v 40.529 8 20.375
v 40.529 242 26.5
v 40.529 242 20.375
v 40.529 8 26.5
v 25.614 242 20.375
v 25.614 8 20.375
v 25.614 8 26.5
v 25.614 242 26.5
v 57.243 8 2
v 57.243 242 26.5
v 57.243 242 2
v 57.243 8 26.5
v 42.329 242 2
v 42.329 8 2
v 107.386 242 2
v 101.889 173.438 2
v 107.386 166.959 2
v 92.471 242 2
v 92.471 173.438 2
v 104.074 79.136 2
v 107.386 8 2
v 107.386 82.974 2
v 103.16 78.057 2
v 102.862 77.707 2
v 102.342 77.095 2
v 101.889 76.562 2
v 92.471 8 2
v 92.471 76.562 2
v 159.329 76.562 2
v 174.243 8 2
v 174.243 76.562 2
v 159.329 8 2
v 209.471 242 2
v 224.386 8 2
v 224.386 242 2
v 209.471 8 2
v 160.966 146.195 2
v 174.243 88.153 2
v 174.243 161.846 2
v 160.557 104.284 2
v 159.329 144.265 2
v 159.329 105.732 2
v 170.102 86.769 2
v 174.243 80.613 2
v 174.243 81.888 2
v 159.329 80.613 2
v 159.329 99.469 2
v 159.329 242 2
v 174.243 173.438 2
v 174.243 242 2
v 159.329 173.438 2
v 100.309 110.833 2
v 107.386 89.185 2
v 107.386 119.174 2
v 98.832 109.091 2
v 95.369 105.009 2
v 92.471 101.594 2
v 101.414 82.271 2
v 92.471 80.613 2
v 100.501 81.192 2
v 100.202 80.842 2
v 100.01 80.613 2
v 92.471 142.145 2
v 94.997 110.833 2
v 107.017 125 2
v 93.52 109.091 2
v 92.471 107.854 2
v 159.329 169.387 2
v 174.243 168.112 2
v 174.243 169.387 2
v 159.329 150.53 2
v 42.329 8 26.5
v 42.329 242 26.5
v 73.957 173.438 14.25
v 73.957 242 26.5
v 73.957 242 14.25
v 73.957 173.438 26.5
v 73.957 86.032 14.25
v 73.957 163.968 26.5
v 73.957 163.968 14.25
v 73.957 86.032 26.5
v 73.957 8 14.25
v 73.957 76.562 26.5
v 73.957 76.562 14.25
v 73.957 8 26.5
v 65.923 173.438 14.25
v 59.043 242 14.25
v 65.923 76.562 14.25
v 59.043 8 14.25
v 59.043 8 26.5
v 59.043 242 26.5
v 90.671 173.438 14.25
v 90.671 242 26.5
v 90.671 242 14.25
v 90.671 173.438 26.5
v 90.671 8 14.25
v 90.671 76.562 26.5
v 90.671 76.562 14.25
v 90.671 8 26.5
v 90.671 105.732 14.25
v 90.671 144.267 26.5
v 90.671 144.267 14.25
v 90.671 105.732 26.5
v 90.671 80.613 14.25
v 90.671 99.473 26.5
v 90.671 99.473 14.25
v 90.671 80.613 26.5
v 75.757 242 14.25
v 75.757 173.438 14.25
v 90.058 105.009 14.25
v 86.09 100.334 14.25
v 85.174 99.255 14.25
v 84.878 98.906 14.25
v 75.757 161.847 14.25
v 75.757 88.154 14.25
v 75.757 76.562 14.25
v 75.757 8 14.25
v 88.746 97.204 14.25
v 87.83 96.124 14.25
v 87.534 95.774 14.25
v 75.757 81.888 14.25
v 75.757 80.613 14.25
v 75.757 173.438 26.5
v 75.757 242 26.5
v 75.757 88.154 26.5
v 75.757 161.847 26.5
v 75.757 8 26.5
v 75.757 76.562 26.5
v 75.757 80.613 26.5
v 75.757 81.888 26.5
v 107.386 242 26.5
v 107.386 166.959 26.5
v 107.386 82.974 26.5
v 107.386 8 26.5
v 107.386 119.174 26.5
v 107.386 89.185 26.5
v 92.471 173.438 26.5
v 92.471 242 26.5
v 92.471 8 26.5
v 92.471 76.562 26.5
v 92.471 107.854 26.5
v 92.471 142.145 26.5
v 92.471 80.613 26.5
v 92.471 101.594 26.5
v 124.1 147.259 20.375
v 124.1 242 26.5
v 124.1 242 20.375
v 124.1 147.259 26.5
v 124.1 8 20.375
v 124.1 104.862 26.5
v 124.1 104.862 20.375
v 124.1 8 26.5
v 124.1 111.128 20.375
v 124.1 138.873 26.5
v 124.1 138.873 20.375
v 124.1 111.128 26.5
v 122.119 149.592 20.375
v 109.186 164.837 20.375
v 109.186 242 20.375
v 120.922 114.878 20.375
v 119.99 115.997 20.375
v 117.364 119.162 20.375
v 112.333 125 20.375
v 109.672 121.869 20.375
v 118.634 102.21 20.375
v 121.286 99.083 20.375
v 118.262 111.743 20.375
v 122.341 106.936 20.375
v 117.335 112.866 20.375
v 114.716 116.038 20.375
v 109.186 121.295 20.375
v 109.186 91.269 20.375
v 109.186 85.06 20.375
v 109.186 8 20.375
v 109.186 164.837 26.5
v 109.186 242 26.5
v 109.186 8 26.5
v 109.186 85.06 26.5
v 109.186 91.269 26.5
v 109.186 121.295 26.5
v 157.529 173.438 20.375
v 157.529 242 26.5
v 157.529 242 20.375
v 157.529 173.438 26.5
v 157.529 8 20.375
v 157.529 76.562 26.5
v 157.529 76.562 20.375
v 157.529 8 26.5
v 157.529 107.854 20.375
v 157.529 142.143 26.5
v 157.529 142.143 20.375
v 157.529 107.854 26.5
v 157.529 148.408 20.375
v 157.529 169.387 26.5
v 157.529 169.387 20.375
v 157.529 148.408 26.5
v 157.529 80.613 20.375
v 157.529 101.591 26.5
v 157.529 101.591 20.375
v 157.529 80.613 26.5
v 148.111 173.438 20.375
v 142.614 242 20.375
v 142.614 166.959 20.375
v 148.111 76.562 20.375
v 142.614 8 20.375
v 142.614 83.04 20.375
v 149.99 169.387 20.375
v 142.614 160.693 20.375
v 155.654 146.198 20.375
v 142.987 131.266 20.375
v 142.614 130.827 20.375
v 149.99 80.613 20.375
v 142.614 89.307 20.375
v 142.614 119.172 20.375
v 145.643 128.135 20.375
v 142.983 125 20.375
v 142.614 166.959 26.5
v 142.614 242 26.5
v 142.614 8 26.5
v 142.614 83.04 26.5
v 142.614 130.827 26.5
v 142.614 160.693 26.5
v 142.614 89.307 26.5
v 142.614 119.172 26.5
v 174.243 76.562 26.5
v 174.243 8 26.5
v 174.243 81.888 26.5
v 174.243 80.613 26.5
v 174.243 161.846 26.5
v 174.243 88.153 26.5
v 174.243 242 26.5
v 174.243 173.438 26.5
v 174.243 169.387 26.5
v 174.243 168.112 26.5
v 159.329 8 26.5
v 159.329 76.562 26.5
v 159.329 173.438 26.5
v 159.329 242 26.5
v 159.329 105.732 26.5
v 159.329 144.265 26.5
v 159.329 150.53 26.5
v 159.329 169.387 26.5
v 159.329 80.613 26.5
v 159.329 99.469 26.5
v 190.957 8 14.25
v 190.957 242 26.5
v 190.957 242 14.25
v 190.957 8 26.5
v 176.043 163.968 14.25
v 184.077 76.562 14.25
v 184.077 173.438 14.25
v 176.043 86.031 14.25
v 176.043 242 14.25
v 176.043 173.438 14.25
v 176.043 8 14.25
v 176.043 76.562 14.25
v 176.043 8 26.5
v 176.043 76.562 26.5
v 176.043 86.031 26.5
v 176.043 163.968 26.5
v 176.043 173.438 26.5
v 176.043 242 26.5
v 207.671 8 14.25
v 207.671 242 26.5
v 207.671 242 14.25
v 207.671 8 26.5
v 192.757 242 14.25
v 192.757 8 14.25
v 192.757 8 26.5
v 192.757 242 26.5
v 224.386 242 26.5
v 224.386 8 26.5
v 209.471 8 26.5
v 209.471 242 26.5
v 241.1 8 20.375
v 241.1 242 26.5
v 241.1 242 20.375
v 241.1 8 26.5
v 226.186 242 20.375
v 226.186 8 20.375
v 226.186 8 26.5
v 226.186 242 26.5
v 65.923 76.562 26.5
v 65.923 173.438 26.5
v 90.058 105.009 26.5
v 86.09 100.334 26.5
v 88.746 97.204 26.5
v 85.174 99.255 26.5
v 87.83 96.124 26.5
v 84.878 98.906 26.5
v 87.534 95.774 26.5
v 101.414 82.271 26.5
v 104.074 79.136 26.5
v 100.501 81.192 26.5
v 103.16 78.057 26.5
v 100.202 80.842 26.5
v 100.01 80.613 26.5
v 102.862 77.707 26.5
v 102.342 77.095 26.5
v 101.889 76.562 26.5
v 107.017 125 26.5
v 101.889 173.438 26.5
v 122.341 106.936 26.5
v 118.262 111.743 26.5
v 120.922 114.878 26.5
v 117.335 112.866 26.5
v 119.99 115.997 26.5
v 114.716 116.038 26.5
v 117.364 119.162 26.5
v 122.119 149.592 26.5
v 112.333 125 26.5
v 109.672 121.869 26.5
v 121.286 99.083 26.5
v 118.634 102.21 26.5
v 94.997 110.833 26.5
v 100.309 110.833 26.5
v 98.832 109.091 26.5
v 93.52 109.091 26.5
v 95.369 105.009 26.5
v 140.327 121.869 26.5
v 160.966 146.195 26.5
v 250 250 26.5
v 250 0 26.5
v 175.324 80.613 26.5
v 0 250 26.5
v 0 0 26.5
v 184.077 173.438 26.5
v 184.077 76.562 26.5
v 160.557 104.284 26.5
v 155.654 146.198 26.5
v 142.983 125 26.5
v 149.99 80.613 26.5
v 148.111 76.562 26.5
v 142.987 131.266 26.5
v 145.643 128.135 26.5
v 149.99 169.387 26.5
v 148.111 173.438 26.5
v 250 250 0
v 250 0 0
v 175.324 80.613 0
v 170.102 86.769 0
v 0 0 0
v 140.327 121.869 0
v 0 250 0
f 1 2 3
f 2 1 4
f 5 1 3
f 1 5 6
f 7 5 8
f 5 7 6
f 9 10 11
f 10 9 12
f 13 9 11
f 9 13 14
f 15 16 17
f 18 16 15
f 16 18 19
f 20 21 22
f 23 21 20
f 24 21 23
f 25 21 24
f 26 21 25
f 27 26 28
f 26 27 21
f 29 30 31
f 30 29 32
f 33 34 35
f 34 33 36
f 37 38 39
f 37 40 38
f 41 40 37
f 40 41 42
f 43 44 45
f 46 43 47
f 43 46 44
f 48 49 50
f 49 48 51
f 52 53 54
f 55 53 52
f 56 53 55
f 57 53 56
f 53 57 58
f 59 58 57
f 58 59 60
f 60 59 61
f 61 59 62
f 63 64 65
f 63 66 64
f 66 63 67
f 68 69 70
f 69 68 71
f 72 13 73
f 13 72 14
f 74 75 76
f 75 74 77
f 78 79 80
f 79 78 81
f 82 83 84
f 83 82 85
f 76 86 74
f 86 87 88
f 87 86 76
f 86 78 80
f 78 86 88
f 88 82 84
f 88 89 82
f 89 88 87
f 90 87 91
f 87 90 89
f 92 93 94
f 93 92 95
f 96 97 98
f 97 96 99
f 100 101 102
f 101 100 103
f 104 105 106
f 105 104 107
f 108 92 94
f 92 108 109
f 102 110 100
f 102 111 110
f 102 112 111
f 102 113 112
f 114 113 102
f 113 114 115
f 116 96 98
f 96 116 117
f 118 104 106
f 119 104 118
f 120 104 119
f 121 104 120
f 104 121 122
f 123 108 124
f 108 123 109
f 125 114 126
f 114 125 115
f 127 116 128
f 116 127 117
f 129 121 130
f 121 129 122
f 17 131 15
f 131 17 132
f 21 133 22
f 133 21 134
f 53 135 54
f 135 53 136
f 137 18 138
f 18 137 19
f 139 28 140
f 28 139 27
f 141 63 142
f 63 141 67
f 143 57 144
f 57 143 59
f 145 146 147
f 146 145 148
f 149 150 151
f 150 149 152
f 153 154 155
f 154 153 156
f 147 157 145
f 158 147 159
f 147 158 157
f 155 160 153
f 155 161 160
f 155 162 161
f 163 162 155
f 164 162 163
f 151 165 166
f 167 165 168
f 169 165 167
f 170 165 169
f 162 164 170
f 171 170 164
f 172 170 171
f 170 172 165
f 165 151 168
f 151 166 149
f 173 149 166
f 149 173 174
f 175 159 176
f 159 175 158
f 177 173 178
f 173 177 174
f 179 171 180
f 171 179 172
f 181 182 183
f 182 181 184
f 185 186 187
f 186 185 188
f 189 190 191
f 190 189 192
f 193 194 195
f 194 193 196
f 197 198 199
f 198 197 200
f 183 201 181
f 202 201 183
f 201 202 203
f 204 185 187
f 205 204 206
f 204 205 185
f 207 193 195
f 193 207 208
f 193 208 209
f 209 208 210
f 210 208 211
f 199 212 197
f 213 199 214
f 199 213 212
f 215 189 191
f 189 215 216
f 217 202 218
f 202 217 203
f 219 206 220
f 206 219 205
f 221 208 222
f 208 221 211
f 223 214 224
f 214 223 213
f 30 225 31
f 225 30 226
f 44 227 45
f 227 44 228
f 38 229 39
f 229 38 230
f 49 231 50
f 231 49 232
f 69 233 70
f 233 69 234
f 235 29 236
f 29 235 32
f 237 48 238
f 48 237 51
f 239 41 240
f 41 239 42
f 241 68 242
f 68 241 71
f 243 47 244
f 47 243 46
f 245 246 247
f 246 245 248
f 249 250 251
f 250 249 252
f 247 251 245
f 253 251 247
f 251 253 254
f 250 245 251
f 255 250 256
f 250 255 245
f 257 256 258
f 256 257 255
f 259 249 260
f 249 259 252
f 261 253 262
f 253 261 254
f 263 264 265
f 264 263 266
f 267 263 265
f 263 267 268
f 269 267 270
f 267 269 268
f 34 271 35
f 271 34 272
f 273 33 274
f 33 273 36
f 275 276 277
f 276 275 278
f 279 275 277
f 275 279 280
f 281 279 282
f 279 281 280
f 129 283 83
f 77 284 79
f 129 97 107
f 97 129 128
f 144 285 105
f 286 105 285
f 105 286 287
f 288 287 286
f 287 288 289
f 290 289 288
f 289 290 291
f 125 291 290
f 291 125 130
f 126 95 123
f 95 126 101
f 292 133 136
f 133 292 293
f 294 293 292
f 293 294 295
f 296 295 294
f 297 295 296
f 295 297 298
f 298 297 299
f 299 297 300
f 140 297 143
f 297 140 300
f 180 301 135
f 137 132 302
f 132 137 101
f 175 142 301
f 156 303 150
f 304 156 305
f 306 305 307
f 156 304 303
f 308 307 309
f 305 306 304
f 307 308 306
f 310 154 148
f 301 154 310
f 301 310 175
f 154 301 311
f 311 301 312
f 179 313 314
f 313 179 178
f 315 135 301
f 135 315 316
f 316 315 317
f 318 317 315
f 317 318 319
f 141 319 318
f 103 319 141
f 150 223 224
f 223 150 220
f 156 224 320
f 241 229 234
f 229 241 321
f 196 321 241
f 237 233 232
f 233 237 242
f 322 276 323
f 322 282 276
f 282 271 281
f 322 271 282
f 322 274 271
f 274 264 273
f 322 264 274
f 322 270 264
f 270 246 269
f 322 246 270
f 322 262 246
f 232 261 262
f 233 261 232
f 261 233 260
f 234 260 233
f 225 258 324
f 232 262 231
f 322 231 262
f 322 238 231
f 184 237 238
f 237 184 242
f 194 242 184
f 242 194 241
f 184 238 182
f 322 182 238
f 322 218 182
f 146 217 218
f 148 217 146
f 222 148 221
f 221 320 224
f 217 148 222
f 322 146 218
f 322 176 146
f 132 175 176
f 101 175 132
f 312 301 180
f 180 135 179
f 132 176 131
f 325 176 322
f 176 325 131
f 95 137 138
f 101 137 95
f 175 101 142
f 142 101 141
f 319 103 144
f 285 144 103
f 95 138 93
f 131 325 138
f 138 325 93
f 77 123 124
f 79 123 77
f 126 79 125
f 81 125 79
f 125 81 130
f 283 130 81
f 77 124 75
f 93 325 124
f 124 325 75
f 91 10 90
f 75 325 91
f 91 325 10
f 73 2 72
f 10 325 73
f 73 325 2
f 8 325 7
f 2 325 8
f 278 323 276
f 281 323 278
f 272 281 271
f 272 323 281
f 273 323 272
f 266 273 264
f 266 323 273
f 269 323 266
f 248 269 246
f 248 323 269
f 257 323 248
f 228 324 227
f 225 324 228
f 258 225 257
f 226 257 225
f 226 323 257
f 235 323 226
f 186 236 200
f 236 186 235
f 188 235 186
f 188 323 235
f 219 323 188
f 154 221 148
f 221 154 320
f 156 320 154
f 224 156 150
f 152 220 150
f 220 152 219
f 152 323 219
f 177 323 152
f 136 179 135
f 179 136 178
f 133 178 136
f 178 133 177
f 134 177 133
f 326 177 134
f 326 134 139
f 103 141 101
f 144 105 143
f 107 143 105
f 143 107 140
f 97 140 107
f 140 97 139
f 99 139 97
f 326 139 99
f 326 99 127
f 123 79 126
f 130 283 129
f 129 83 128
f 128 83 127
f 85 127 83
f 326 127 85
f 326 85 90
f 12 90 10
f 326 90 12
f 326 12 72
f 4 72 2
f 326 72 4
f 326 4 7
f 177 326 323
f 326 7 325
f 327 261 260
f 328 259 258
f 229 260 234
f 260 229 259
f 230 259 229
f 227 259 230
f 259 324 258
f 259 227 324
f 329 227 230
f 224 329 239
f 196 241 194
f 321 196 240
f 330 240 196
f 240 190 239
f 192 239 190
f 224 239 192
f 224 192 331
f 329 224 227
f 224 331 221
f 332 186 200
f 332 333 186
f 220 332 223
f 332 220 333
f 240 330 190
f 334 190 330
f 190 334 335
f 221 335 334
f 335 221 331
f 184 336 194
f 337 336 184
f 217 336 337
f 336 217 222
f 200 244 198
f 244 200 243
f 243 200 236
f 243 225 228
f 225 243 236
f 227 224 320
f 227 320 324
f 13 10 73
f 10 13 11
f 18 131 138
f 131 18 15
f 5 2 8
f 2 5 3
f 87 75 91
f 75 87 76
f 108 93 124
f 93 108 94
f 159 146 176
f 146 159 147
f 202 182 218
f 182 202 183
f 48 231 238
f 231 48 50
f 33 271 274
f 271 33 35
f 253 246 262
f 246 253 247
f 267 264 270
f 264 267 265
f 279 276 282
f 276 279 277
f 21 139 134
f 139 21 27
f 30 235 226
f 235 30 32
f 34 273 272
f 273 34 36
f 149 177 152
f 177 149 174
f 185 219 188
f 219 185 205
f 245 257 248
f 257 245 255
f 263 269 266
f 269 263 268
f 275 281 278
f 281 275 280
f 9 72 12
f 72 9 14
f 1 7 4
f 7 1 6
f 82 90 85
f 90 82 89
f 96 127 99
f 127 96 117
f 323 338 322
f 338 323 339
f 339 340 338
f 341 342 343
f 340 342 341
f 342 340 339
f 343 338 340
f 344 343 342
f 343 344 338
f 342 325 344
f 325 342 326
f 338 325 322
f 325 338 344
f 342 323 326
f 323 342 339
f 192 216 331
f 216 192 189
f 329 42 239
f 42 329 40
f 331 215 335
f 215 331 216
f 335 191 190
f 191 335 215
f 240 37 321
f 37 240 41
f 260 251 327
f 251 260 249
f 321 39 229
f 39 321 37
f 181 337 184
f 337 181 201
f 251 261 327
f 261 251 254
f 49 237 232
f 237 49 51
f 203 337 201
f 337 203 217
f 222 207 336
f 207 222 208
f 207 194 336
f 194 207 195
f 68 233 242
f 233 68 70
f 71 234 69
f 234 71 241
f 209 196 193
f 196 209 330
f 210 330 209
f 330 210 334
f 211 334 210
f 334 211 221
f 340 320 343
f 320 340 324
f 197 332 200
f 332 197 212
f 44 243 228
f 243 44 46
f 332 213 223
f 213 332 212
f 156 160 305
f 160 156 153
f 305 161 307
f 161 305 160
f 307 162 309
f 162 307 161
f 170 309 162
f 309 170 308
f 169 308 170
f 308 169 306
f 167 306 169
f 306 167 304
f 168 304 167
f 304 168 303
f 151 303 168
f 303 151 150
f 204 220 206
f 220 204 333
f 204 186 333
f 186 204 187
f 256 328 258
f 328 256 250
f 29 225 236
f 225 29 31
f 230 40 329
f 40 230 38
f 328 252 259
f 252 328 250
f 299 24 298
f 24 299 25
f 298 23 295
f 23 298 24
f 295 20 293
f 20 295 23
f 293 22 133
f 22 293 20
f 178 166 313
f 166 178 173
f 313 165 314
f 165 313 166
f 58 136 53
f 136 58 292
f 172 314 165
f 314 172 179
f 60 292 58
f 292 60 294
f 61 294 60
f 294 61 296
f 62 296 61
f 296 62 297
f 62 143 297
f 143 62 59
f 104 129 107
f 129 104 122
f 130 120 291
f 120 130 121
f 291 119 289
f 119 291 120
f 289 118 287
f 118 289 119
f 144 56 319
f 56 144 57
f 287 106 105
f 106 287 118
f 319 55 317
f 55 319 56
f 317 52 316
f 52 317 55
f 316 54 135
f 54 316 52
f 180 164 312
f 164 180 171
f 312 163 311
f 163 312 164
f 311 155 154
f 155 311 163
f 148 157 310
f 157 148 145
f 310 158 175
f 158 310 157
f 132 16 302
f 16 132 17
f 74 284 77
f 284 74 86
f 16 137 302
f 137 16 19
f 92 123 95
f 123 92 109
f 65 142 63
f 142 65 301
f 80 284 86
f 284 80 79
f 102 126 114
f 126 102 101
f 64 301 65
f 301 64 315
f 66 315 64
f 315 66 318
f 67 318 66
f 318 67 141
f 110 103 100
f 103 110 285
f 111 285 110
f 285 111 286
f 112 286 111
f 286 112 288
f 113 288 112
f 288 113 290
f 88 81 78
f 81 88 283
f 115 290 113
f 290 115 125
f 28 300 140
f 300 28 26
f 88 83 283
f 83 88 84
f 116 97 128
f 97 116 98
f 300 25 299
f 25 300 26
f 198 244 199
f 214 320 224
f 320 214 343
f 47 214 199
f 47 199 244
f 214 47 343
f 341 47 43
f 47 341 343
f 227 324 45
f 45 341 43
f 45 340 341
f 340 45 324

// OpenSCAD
// file: makerx_brand.scad
// =============================================================================
// makerx_brand.scad  —  Shared brand + acoustic library for MakerX tiles
// -----------------------------------------------------------------------------
// Included with include<makerx_brand.scad> by all three variant files
// (qrd / skyline / absorber). It contains ONLY parameters, functions and
// modules — NO top-level geometry — so including it is side-effect-free.
//
// BRAND SOURCE  (captured from https://makerx.com.au/ CSS + logomark SVG):
//   --color-mx-black         #0e0f10
//   --color-mx-electic-blue  #16acf2   (electric blue)
//   --color-mx-magenta       #cc3a9d
//   --color-mx-gold          #ffc023
//   signature hero gradient  electric-blue -> magenta -> gold
//   X logomark               two mirrored chevron polygons (SVG viewBox
//                            0 0 1300 1100, Y-flipped into OpenSCAD Y-up space)
//
// TERMINOLOGY -> code:
//   "brand colours"     -> MX_BLACK / MX_BLUE / MX_MAGENTA / MX_GOLD
//   "the X / logo"      -> mx_x_2d(), mx_x_placed_2d(), mx_logo_w
//   "gradient zones"    -> mx_zone_name(), mx_color_region_2d()
//   "the frame / rim"   -> frame_w, mx_frame_2d()
//   "diffusion band"    -> f_low, f_high, N, depth_unit, max_depth, max_feat_w
// =============================================================================

// ---- Brand palette (web hex; affects preview + 3MF/AMF colour only) ----------
MX_BLACK   = "#0e0f10";
MX_BLUE    = "#16acf2";   // electric blue
MX_MAGENTA = "#cc3a9d";
MX_GOLD    = "#ffc023";

// ---- Printer / derived constants --------------------------------------------
nozzle_diameter = 0.4;
layer_height    = 0.2;
ew              = nozzle_diameter * 1.125;   // extrusion width = 0.45 mm
fudge           = 0.01;                       // boolean overlap
ef_chamfer      = 0.4;                        // elephant-foot compensation
$fn            = $preview ? 24 : 48;

// ---- Tile geometry (shared defaults; a variant file may override) -----------
tile      = 250;                 // module footprint X & Y (tiles butt together)
frame_w   = 8;                   // perimeter frame / rim width (black border)
interior  = tile - 2*frame_w;    // acoustic field side length

// ---- Acoustic band targets --------------------------------------------------
c_air   = 343000;                // speed of sound in air (mm/s)
f_low   = 4000;                  // low edge of diffusion band  -> max well depth
f_high  = 10000;                 // high edge of diffusion band -> max feature width
N       = 7;                     // Schroeder prime (quadratic-residue diffuser)
periods = 2;                     // QR periods across the tile -> N*periods cells

// quadratic-residue sequence  s_n = n^2 mod N   (n = 0..N-1)
function qr_seq(n) = (n*n) % N;
function qr_max()  = max([for (n=[0:N-1]) qr_seq(n)]);   // = 4 for N=7

lambda_low  = c_air / f_low;             // 85.75 mm  (wavelength at f_low)
depth_unit  = lambda_low / (2*N);        // 6.125 mm  (QRD depth quantum)
max_depth   = qr_max() * depth_unit;     // 24.5 mm   (deepest well / tallest cell)
max_feat_w  = c_air / (2*f_high);        // 17.15 mm  (cell width must be <= this)

fin_t       = 4*ew;                      // QRD divider / structural wall = 4 perimeters (1.8mm)

// ---- X logomark polygons (Y-flipped from site SVG, viewBox 1300x1100) --------
MX_VB = 1300;   // viewBox width  (used for scaling)
MX_CX = 650;    // viewBox centre x
MX_CY = 550;    // viewBox centre y (post-flip, content is symmetric about this)

MX_X_POLY_A = [
  [900.37,1074.75], [743.06,889.31], [701.27,840.11], [691.10,828.10], [701.00,816.41],
  [719.91,794.14], [730.09,806.15], [771.87,855.40], [920.72,1030.86], [1195.18,1030.86],
  [1010.86,813.57], [982.09,779.65], [844.86,617.88], [816.04,583.92], [787.23,550.00],
  [816.04,516.08], [1195.18,69.14], [920.72,69.14], [771.87,244.61], [743.06,278.56],
  [678.81,354.31], [650.00,388.22], [605.82,440.34], [595.73,452.47], [567.28,486.75],
  [538.59,452.91], [566.96,418.55], [577.01,406.38], [621.19,354.31], [650.00,320.34],
  [663.93,303.94], [692.70,270.03], [705.59,254.82], [714.25,244.61], [734.36,220.90],
  [743.06,210.65], [900.37,25.25], [1290.00,25.25], [1035.20,325.58], [844.82,550.00],
  [873.63,583.96], [1010.86,745.70], [1039.63,779.61], [1290.00,1074.75]
];
MX_X_POLY_B = [
  [10.00,1074.75], [455.18,550.00], [324.97,396.52], [308.97,377.65], [271.46,333.43],
  [228.48,282.79], [218.55,271.10], [215.35,267.31], [10.00,25.25], [399.63,25.25],
  [404.54,31.03], [410.17,37.66], [413.40,41.45], [423.30,53.14], [609.77,269.23],
  [581.04,303.11], [394.49,87.10], [384.59,75.41], [381.36,71.62], [379.28,69.14],
  [104.82,69.14], [244.12,233.39], [247.32,237.18], [257.25,248.88], [329.00,333.43],
  [366.51,377.65], [382.51,396.52], [483.95,516.08], [512.77,550.00], [650.00,711.78],
  [678.81,745.69], [650.00,779.66], [618.79,816.41], [399.63,1074.75]
];

// 2D X logomark, centred at origin, scaled to approx width `w`
module mx_x_2d(w) {
    scale(w / MX_VB) translate([-MX_CX, -MX_CY])
        union() { polygon(MX_X_POLY_A); polygon(MX_X_POLY_B); }
}

mx_logo_w = 120;   // logomark target width (mm) on the tile
module mx_x_placed_2d() {
    translate([tile/2, tile/2]) mx_x_2d(mx_logo_w);
}

// ---- Gradient zones (diagonal electric-blue -> magenta -> gold) -------------
// Matches the makerx.com.au hero: blue at TOP-LEFT -> magenta -> gold at
// BOTTOM-RIGHT (viewer looking at the +Z tile face, Y = up). The gradient
// parameter is t = (x + (tile - y)) / (2*tile) in [0,1]; blue t<1/3,
// magenta 1/3..2/3, gold >2/3.  mx_below(cc) returns the region t*2*tile <= cc.
module mx_below(cc) {
    // triangle for (x + y <= cc), reflected about y = tile/2 so it becomes
    // (x + (tile - y) <= cc) -> the brand diagonal (blue top-left).
    translate([0, tile/2]) mirror([0,1,0]) translate([0,-tile/2])
        polygon([[-tile,-tile], [cc+tile,-tile], [-tile,cc+tile]]);
}
// 2D interior region (inside the frame) and the frame ring
module mx_interior_2d() { translate([frame_w, frame_w]) square([interior, interior]); }
module mx_frame_2d()    { difference() { square([tile, tile]); mx_interior_2d(); } }

// 2D region for one colour body. The four regions PARTITION the whole tile
// (mutually exclusive, union = full square) so colour bodies never overlap/gap:
//   black            = frame ring  +  X logomark (drawn over the field)
//   blue/magenta/gold = its diagonal interior band, minus the X footprint
module mx_color_region_2d(name) {
    if (name == "black") {
        union() {
            mx_frame_2d();
            intersection() { mx_interior_2d(); mx_x_placed_2d(); }
        }
    } else {
        difference() {
            intersection() {
                mx_interior_2d();
                if (name == "blue")          mx_below(2*tile/3);
                else if (name == "magenta")  difference() { mx_below(4*tile/3); mx_below(2*tile/3); }
                else /* gold */              difference() { square([tile,tile]); mx_below(4*tile/3); }
            }
            mx_x_placed_2d();   // X belongs to the black body, carve it out here
        }
    }
}

// Mounting: these tiles have a flat back (diffusers) or an open standoff frame
// (absorber) intended for the usual acoustic-panel mounting — removable mounting
// strips (e.g. Command) or spray/construction adhesive on the back / frame edge.
// No screw bosses are modelled (a 2 mm back is too thin for a keyhole, and bosses
// would stop the tile sitting flat).
// main file
// === DESCRIPTION ===
// MakerX QRD Acoustic Diffuser Tile (variant 1 of 3)
//   A 250x250 mm wall tile that scatters mid/high-frequency sound reflections
//   instead of bouncing them back specularly. It is a 1-D Schroeder QUADRATIC-
//   RESIDUE DIFFUSER (QRD): a row of wells whose depths follow the sequence
//   s_n = n^2 mod 7, so an incoming wavefront is re-radiated with a spread of
//   phases and the energy is spattered across angles rather than mirrored.
//   This does NOT "absorb" sound (a rigid panel can't) — it removes the harsh
//   specular reflection / flutter echo that makes rooms sound boxy.
//
// Physical context:
//   Mounts flat to a wall or ceiling (flat solid back, adhesive / Command
//   strips / optional keyhole). Tiles butt edge-to-edge on a 250 mm pitch to
//   cover larger areas. Lives indoors at room temperature; the only "load" is
//   its own weight + handling, so structure is light.
//
// Design decisions:
//   - Band 4-10 kHz (user target): well WIDTH sets the top (f=c/2w) and well
//     DEPTH sets the bottom (Schroeder). Both come out small -> a shallow,
//     fast-printing tile (~26 mm) unlike a bass diffuser (would be 80mm+).
//   - 1-D wells run full-length in Y; depth steps along X. Scatters strongly
//     in the horizontal plane (the usual flutter-echo axis between walls).
//   - Print BACK-DOWN: wells open upward, dividers are tall thin VERTICAL
//     walls (ideal FDM) — zero supports, no bridges.
//   - Brand: signature blue->magenta->gold diagonal gradient across the field
//     + the angular X logomark as a flush, solid (non-welled) inlay. Exported
//     as 4 colour bodies for AMS (see "part").
//
// Terminology -> code:
//   "the wells / grooves"  -> field_qrd(), pitch, well_opening, qr_seq()
//   "the dividers / fins"  -> fin_t
//   "well depth"           -> depth_unit, max_depth (from f_low/N in brand)
//   "the X / logo"         -> mx_x_placed_2d()  (in makerx_brand.scad)
//   "gradient zones"       -> mx_color_region_2d()  (blue/magenta/gold)
//   "the frame / rim"      -> frame_w, mx_frame_2d()
//   "back plate"           -> base_thick
//
// Common modifications:
//   Lower bottom frequency  -> f_low (brand) down; max_depth grows (deeper)
//   Raise top frequency     -> f_high up; needs narrower wells (more cells)
//   More scatter cells      -> periods (brand) 2->3 (narrower wells)
//   Bigger/smaller logo     -> mx_logo_w (brand)
//   Thicker wall mount       -> base_thick
//   Print as one colour     -> just export part="all" geometry / paint in slicer
//
// Overall dimensions: 250 x 250 x ~26.5 mm  (fits Bambu 256^3 with ~3mm/side)
// Coordinate system: X,Y = tile face; Z = height from build plate.
//   Z=0 is the FLAT BACK (on the bed / against the wall); +Z faces the ROOM.
//   Model is in print orientation — OpenSCAD preview matches the print.

// === PRINT SETTINGS ===
// Material: PETG (per user default; ductile, won't shatter, fine indoors)
// Layer Height: 0.2 mm
// Walls/Perimeters: 3 (fins are 2.0 mm = ~4 perimeters, print solid)
// Infill: 15% gyroid (back plate only; fins print as solid walls)
// Supports: None — wells open up, dividers are vertical, no overhang >45deg
// Orientation: As modeled. Flat back on the plate, wells pointing up.
// Notes:
//   - 250 mm flat base on PETG: use a brim (5-8 mm) + clean bed; enable the
//     slicer's Elephant-Foot Compensation (~0.15 mm) so tiles butt flush
//     (EFC is REQUIRED for a flush tile-to-tile joint — it is not modelled).
//   - Dry PETG (60-65C/4-6h). 30-40% part cooling fan.
//   - Mounting: flat back takes adhesive / removable mounting strips.
//   - Scatter axis: this 1-D QRD scatters in the plane PERPENDICULAR to the
//     wells. Mount with the wells running VERTICALLY to break up horizontal
//     flutter echo between facing walls (the usual case); rotate 90 deg for
//     vertical-plane scatter.
//   - 4 colours via AMS: import the 4 part STLs together as ONE object
//     (black/blue/magenta/gold) and assign a filament to each.

include <makerx_brand.scad>

// === PARAMETERS ===
base_thick = 2.0;                         // solid back plate thickness (mm)
part       = "all";                        // "all" | "black" | "blue" | "magenta" | "gold"

// === DERIVED CONSTANTS ===
field_top = base_thick + max_depth;        // flush top plane of fins / frame / logo
pitch     = interior / (periods * N);      // well pitch along X
well_opening = pitch - fin_t;

// === ACCEPTANCE CONTRACTS (fail the build if violated) ===
assert(tile <= 256, "Tile exceeds 256mm Bambu bed");
assert(well_opening <= max_feat_w, "Well too wide -> loses the 10 kHz top end");
assert(well_opening > 4*ew, "Well too narrow to print/scatter");
assert(fin_t >= 4*ew, "Divider thinner than 4 perimeters");
assert(max_depth > 0, "Degenerate well depth");
echo(VARIANT="QRD", pitch=pitch, well_opening=well_opening, max_depth=max_depth,
     f_high_actual=c_air/(2*well_opening), overall_depth=field_top);

// === MODULES ===
// The welled field: a solid block with QR-depth slots cut from the top.
module field_qrd() {
    difference() {
        translate([frame_w, frame_w, base_thick])
            cube([interior, interior, max_depth]);
        for (i = [0 : periods*N - 1]) {
            d = qr_seq(i % N) * depth_unit;            // this well's depth
            if (d > 0)
                translate([frame_w + i*pitch + fin_t/2, frame_w - fudge, field_top - d])
                    cube([pitch - fin_t, interior + 2*fudge, d + fudge]);
        }
    }
}

// The complete tile as a single manifold solid (colour-agnostic).
module full_qrd() {
    union() {
        cube([tile, tile, base_thick]);                       // flat back plate
        linear_extrude(field_top) mx_frame_2d();              // perimeter rim
        field_qrd();                                          // QRD wells
        linear_extrude(field_top)                             // flush solid X logo
            intersection() { mx_interior_2d(); mx_x_placed_2d(); }
    }
}

// One colour body = full solid intersected with that colour's 2D region.
module body(name) {
    intersection() {
        full_qrd();
        translate([0, 0, -fudge])
            linear_extrude(field_top + 2*fudge) mx_color_region_2d(name);
    }
}

module assembly() {
    color(MX_BLACK)   body("black");
    color(MX_BLUE)    body("blue");
    color(MX_MAGENTA) body("magenta");
    color(MX_GOLD)    body("gold");
}

// === RENDER ===
if (part == "all") assembly();
else body(part);
